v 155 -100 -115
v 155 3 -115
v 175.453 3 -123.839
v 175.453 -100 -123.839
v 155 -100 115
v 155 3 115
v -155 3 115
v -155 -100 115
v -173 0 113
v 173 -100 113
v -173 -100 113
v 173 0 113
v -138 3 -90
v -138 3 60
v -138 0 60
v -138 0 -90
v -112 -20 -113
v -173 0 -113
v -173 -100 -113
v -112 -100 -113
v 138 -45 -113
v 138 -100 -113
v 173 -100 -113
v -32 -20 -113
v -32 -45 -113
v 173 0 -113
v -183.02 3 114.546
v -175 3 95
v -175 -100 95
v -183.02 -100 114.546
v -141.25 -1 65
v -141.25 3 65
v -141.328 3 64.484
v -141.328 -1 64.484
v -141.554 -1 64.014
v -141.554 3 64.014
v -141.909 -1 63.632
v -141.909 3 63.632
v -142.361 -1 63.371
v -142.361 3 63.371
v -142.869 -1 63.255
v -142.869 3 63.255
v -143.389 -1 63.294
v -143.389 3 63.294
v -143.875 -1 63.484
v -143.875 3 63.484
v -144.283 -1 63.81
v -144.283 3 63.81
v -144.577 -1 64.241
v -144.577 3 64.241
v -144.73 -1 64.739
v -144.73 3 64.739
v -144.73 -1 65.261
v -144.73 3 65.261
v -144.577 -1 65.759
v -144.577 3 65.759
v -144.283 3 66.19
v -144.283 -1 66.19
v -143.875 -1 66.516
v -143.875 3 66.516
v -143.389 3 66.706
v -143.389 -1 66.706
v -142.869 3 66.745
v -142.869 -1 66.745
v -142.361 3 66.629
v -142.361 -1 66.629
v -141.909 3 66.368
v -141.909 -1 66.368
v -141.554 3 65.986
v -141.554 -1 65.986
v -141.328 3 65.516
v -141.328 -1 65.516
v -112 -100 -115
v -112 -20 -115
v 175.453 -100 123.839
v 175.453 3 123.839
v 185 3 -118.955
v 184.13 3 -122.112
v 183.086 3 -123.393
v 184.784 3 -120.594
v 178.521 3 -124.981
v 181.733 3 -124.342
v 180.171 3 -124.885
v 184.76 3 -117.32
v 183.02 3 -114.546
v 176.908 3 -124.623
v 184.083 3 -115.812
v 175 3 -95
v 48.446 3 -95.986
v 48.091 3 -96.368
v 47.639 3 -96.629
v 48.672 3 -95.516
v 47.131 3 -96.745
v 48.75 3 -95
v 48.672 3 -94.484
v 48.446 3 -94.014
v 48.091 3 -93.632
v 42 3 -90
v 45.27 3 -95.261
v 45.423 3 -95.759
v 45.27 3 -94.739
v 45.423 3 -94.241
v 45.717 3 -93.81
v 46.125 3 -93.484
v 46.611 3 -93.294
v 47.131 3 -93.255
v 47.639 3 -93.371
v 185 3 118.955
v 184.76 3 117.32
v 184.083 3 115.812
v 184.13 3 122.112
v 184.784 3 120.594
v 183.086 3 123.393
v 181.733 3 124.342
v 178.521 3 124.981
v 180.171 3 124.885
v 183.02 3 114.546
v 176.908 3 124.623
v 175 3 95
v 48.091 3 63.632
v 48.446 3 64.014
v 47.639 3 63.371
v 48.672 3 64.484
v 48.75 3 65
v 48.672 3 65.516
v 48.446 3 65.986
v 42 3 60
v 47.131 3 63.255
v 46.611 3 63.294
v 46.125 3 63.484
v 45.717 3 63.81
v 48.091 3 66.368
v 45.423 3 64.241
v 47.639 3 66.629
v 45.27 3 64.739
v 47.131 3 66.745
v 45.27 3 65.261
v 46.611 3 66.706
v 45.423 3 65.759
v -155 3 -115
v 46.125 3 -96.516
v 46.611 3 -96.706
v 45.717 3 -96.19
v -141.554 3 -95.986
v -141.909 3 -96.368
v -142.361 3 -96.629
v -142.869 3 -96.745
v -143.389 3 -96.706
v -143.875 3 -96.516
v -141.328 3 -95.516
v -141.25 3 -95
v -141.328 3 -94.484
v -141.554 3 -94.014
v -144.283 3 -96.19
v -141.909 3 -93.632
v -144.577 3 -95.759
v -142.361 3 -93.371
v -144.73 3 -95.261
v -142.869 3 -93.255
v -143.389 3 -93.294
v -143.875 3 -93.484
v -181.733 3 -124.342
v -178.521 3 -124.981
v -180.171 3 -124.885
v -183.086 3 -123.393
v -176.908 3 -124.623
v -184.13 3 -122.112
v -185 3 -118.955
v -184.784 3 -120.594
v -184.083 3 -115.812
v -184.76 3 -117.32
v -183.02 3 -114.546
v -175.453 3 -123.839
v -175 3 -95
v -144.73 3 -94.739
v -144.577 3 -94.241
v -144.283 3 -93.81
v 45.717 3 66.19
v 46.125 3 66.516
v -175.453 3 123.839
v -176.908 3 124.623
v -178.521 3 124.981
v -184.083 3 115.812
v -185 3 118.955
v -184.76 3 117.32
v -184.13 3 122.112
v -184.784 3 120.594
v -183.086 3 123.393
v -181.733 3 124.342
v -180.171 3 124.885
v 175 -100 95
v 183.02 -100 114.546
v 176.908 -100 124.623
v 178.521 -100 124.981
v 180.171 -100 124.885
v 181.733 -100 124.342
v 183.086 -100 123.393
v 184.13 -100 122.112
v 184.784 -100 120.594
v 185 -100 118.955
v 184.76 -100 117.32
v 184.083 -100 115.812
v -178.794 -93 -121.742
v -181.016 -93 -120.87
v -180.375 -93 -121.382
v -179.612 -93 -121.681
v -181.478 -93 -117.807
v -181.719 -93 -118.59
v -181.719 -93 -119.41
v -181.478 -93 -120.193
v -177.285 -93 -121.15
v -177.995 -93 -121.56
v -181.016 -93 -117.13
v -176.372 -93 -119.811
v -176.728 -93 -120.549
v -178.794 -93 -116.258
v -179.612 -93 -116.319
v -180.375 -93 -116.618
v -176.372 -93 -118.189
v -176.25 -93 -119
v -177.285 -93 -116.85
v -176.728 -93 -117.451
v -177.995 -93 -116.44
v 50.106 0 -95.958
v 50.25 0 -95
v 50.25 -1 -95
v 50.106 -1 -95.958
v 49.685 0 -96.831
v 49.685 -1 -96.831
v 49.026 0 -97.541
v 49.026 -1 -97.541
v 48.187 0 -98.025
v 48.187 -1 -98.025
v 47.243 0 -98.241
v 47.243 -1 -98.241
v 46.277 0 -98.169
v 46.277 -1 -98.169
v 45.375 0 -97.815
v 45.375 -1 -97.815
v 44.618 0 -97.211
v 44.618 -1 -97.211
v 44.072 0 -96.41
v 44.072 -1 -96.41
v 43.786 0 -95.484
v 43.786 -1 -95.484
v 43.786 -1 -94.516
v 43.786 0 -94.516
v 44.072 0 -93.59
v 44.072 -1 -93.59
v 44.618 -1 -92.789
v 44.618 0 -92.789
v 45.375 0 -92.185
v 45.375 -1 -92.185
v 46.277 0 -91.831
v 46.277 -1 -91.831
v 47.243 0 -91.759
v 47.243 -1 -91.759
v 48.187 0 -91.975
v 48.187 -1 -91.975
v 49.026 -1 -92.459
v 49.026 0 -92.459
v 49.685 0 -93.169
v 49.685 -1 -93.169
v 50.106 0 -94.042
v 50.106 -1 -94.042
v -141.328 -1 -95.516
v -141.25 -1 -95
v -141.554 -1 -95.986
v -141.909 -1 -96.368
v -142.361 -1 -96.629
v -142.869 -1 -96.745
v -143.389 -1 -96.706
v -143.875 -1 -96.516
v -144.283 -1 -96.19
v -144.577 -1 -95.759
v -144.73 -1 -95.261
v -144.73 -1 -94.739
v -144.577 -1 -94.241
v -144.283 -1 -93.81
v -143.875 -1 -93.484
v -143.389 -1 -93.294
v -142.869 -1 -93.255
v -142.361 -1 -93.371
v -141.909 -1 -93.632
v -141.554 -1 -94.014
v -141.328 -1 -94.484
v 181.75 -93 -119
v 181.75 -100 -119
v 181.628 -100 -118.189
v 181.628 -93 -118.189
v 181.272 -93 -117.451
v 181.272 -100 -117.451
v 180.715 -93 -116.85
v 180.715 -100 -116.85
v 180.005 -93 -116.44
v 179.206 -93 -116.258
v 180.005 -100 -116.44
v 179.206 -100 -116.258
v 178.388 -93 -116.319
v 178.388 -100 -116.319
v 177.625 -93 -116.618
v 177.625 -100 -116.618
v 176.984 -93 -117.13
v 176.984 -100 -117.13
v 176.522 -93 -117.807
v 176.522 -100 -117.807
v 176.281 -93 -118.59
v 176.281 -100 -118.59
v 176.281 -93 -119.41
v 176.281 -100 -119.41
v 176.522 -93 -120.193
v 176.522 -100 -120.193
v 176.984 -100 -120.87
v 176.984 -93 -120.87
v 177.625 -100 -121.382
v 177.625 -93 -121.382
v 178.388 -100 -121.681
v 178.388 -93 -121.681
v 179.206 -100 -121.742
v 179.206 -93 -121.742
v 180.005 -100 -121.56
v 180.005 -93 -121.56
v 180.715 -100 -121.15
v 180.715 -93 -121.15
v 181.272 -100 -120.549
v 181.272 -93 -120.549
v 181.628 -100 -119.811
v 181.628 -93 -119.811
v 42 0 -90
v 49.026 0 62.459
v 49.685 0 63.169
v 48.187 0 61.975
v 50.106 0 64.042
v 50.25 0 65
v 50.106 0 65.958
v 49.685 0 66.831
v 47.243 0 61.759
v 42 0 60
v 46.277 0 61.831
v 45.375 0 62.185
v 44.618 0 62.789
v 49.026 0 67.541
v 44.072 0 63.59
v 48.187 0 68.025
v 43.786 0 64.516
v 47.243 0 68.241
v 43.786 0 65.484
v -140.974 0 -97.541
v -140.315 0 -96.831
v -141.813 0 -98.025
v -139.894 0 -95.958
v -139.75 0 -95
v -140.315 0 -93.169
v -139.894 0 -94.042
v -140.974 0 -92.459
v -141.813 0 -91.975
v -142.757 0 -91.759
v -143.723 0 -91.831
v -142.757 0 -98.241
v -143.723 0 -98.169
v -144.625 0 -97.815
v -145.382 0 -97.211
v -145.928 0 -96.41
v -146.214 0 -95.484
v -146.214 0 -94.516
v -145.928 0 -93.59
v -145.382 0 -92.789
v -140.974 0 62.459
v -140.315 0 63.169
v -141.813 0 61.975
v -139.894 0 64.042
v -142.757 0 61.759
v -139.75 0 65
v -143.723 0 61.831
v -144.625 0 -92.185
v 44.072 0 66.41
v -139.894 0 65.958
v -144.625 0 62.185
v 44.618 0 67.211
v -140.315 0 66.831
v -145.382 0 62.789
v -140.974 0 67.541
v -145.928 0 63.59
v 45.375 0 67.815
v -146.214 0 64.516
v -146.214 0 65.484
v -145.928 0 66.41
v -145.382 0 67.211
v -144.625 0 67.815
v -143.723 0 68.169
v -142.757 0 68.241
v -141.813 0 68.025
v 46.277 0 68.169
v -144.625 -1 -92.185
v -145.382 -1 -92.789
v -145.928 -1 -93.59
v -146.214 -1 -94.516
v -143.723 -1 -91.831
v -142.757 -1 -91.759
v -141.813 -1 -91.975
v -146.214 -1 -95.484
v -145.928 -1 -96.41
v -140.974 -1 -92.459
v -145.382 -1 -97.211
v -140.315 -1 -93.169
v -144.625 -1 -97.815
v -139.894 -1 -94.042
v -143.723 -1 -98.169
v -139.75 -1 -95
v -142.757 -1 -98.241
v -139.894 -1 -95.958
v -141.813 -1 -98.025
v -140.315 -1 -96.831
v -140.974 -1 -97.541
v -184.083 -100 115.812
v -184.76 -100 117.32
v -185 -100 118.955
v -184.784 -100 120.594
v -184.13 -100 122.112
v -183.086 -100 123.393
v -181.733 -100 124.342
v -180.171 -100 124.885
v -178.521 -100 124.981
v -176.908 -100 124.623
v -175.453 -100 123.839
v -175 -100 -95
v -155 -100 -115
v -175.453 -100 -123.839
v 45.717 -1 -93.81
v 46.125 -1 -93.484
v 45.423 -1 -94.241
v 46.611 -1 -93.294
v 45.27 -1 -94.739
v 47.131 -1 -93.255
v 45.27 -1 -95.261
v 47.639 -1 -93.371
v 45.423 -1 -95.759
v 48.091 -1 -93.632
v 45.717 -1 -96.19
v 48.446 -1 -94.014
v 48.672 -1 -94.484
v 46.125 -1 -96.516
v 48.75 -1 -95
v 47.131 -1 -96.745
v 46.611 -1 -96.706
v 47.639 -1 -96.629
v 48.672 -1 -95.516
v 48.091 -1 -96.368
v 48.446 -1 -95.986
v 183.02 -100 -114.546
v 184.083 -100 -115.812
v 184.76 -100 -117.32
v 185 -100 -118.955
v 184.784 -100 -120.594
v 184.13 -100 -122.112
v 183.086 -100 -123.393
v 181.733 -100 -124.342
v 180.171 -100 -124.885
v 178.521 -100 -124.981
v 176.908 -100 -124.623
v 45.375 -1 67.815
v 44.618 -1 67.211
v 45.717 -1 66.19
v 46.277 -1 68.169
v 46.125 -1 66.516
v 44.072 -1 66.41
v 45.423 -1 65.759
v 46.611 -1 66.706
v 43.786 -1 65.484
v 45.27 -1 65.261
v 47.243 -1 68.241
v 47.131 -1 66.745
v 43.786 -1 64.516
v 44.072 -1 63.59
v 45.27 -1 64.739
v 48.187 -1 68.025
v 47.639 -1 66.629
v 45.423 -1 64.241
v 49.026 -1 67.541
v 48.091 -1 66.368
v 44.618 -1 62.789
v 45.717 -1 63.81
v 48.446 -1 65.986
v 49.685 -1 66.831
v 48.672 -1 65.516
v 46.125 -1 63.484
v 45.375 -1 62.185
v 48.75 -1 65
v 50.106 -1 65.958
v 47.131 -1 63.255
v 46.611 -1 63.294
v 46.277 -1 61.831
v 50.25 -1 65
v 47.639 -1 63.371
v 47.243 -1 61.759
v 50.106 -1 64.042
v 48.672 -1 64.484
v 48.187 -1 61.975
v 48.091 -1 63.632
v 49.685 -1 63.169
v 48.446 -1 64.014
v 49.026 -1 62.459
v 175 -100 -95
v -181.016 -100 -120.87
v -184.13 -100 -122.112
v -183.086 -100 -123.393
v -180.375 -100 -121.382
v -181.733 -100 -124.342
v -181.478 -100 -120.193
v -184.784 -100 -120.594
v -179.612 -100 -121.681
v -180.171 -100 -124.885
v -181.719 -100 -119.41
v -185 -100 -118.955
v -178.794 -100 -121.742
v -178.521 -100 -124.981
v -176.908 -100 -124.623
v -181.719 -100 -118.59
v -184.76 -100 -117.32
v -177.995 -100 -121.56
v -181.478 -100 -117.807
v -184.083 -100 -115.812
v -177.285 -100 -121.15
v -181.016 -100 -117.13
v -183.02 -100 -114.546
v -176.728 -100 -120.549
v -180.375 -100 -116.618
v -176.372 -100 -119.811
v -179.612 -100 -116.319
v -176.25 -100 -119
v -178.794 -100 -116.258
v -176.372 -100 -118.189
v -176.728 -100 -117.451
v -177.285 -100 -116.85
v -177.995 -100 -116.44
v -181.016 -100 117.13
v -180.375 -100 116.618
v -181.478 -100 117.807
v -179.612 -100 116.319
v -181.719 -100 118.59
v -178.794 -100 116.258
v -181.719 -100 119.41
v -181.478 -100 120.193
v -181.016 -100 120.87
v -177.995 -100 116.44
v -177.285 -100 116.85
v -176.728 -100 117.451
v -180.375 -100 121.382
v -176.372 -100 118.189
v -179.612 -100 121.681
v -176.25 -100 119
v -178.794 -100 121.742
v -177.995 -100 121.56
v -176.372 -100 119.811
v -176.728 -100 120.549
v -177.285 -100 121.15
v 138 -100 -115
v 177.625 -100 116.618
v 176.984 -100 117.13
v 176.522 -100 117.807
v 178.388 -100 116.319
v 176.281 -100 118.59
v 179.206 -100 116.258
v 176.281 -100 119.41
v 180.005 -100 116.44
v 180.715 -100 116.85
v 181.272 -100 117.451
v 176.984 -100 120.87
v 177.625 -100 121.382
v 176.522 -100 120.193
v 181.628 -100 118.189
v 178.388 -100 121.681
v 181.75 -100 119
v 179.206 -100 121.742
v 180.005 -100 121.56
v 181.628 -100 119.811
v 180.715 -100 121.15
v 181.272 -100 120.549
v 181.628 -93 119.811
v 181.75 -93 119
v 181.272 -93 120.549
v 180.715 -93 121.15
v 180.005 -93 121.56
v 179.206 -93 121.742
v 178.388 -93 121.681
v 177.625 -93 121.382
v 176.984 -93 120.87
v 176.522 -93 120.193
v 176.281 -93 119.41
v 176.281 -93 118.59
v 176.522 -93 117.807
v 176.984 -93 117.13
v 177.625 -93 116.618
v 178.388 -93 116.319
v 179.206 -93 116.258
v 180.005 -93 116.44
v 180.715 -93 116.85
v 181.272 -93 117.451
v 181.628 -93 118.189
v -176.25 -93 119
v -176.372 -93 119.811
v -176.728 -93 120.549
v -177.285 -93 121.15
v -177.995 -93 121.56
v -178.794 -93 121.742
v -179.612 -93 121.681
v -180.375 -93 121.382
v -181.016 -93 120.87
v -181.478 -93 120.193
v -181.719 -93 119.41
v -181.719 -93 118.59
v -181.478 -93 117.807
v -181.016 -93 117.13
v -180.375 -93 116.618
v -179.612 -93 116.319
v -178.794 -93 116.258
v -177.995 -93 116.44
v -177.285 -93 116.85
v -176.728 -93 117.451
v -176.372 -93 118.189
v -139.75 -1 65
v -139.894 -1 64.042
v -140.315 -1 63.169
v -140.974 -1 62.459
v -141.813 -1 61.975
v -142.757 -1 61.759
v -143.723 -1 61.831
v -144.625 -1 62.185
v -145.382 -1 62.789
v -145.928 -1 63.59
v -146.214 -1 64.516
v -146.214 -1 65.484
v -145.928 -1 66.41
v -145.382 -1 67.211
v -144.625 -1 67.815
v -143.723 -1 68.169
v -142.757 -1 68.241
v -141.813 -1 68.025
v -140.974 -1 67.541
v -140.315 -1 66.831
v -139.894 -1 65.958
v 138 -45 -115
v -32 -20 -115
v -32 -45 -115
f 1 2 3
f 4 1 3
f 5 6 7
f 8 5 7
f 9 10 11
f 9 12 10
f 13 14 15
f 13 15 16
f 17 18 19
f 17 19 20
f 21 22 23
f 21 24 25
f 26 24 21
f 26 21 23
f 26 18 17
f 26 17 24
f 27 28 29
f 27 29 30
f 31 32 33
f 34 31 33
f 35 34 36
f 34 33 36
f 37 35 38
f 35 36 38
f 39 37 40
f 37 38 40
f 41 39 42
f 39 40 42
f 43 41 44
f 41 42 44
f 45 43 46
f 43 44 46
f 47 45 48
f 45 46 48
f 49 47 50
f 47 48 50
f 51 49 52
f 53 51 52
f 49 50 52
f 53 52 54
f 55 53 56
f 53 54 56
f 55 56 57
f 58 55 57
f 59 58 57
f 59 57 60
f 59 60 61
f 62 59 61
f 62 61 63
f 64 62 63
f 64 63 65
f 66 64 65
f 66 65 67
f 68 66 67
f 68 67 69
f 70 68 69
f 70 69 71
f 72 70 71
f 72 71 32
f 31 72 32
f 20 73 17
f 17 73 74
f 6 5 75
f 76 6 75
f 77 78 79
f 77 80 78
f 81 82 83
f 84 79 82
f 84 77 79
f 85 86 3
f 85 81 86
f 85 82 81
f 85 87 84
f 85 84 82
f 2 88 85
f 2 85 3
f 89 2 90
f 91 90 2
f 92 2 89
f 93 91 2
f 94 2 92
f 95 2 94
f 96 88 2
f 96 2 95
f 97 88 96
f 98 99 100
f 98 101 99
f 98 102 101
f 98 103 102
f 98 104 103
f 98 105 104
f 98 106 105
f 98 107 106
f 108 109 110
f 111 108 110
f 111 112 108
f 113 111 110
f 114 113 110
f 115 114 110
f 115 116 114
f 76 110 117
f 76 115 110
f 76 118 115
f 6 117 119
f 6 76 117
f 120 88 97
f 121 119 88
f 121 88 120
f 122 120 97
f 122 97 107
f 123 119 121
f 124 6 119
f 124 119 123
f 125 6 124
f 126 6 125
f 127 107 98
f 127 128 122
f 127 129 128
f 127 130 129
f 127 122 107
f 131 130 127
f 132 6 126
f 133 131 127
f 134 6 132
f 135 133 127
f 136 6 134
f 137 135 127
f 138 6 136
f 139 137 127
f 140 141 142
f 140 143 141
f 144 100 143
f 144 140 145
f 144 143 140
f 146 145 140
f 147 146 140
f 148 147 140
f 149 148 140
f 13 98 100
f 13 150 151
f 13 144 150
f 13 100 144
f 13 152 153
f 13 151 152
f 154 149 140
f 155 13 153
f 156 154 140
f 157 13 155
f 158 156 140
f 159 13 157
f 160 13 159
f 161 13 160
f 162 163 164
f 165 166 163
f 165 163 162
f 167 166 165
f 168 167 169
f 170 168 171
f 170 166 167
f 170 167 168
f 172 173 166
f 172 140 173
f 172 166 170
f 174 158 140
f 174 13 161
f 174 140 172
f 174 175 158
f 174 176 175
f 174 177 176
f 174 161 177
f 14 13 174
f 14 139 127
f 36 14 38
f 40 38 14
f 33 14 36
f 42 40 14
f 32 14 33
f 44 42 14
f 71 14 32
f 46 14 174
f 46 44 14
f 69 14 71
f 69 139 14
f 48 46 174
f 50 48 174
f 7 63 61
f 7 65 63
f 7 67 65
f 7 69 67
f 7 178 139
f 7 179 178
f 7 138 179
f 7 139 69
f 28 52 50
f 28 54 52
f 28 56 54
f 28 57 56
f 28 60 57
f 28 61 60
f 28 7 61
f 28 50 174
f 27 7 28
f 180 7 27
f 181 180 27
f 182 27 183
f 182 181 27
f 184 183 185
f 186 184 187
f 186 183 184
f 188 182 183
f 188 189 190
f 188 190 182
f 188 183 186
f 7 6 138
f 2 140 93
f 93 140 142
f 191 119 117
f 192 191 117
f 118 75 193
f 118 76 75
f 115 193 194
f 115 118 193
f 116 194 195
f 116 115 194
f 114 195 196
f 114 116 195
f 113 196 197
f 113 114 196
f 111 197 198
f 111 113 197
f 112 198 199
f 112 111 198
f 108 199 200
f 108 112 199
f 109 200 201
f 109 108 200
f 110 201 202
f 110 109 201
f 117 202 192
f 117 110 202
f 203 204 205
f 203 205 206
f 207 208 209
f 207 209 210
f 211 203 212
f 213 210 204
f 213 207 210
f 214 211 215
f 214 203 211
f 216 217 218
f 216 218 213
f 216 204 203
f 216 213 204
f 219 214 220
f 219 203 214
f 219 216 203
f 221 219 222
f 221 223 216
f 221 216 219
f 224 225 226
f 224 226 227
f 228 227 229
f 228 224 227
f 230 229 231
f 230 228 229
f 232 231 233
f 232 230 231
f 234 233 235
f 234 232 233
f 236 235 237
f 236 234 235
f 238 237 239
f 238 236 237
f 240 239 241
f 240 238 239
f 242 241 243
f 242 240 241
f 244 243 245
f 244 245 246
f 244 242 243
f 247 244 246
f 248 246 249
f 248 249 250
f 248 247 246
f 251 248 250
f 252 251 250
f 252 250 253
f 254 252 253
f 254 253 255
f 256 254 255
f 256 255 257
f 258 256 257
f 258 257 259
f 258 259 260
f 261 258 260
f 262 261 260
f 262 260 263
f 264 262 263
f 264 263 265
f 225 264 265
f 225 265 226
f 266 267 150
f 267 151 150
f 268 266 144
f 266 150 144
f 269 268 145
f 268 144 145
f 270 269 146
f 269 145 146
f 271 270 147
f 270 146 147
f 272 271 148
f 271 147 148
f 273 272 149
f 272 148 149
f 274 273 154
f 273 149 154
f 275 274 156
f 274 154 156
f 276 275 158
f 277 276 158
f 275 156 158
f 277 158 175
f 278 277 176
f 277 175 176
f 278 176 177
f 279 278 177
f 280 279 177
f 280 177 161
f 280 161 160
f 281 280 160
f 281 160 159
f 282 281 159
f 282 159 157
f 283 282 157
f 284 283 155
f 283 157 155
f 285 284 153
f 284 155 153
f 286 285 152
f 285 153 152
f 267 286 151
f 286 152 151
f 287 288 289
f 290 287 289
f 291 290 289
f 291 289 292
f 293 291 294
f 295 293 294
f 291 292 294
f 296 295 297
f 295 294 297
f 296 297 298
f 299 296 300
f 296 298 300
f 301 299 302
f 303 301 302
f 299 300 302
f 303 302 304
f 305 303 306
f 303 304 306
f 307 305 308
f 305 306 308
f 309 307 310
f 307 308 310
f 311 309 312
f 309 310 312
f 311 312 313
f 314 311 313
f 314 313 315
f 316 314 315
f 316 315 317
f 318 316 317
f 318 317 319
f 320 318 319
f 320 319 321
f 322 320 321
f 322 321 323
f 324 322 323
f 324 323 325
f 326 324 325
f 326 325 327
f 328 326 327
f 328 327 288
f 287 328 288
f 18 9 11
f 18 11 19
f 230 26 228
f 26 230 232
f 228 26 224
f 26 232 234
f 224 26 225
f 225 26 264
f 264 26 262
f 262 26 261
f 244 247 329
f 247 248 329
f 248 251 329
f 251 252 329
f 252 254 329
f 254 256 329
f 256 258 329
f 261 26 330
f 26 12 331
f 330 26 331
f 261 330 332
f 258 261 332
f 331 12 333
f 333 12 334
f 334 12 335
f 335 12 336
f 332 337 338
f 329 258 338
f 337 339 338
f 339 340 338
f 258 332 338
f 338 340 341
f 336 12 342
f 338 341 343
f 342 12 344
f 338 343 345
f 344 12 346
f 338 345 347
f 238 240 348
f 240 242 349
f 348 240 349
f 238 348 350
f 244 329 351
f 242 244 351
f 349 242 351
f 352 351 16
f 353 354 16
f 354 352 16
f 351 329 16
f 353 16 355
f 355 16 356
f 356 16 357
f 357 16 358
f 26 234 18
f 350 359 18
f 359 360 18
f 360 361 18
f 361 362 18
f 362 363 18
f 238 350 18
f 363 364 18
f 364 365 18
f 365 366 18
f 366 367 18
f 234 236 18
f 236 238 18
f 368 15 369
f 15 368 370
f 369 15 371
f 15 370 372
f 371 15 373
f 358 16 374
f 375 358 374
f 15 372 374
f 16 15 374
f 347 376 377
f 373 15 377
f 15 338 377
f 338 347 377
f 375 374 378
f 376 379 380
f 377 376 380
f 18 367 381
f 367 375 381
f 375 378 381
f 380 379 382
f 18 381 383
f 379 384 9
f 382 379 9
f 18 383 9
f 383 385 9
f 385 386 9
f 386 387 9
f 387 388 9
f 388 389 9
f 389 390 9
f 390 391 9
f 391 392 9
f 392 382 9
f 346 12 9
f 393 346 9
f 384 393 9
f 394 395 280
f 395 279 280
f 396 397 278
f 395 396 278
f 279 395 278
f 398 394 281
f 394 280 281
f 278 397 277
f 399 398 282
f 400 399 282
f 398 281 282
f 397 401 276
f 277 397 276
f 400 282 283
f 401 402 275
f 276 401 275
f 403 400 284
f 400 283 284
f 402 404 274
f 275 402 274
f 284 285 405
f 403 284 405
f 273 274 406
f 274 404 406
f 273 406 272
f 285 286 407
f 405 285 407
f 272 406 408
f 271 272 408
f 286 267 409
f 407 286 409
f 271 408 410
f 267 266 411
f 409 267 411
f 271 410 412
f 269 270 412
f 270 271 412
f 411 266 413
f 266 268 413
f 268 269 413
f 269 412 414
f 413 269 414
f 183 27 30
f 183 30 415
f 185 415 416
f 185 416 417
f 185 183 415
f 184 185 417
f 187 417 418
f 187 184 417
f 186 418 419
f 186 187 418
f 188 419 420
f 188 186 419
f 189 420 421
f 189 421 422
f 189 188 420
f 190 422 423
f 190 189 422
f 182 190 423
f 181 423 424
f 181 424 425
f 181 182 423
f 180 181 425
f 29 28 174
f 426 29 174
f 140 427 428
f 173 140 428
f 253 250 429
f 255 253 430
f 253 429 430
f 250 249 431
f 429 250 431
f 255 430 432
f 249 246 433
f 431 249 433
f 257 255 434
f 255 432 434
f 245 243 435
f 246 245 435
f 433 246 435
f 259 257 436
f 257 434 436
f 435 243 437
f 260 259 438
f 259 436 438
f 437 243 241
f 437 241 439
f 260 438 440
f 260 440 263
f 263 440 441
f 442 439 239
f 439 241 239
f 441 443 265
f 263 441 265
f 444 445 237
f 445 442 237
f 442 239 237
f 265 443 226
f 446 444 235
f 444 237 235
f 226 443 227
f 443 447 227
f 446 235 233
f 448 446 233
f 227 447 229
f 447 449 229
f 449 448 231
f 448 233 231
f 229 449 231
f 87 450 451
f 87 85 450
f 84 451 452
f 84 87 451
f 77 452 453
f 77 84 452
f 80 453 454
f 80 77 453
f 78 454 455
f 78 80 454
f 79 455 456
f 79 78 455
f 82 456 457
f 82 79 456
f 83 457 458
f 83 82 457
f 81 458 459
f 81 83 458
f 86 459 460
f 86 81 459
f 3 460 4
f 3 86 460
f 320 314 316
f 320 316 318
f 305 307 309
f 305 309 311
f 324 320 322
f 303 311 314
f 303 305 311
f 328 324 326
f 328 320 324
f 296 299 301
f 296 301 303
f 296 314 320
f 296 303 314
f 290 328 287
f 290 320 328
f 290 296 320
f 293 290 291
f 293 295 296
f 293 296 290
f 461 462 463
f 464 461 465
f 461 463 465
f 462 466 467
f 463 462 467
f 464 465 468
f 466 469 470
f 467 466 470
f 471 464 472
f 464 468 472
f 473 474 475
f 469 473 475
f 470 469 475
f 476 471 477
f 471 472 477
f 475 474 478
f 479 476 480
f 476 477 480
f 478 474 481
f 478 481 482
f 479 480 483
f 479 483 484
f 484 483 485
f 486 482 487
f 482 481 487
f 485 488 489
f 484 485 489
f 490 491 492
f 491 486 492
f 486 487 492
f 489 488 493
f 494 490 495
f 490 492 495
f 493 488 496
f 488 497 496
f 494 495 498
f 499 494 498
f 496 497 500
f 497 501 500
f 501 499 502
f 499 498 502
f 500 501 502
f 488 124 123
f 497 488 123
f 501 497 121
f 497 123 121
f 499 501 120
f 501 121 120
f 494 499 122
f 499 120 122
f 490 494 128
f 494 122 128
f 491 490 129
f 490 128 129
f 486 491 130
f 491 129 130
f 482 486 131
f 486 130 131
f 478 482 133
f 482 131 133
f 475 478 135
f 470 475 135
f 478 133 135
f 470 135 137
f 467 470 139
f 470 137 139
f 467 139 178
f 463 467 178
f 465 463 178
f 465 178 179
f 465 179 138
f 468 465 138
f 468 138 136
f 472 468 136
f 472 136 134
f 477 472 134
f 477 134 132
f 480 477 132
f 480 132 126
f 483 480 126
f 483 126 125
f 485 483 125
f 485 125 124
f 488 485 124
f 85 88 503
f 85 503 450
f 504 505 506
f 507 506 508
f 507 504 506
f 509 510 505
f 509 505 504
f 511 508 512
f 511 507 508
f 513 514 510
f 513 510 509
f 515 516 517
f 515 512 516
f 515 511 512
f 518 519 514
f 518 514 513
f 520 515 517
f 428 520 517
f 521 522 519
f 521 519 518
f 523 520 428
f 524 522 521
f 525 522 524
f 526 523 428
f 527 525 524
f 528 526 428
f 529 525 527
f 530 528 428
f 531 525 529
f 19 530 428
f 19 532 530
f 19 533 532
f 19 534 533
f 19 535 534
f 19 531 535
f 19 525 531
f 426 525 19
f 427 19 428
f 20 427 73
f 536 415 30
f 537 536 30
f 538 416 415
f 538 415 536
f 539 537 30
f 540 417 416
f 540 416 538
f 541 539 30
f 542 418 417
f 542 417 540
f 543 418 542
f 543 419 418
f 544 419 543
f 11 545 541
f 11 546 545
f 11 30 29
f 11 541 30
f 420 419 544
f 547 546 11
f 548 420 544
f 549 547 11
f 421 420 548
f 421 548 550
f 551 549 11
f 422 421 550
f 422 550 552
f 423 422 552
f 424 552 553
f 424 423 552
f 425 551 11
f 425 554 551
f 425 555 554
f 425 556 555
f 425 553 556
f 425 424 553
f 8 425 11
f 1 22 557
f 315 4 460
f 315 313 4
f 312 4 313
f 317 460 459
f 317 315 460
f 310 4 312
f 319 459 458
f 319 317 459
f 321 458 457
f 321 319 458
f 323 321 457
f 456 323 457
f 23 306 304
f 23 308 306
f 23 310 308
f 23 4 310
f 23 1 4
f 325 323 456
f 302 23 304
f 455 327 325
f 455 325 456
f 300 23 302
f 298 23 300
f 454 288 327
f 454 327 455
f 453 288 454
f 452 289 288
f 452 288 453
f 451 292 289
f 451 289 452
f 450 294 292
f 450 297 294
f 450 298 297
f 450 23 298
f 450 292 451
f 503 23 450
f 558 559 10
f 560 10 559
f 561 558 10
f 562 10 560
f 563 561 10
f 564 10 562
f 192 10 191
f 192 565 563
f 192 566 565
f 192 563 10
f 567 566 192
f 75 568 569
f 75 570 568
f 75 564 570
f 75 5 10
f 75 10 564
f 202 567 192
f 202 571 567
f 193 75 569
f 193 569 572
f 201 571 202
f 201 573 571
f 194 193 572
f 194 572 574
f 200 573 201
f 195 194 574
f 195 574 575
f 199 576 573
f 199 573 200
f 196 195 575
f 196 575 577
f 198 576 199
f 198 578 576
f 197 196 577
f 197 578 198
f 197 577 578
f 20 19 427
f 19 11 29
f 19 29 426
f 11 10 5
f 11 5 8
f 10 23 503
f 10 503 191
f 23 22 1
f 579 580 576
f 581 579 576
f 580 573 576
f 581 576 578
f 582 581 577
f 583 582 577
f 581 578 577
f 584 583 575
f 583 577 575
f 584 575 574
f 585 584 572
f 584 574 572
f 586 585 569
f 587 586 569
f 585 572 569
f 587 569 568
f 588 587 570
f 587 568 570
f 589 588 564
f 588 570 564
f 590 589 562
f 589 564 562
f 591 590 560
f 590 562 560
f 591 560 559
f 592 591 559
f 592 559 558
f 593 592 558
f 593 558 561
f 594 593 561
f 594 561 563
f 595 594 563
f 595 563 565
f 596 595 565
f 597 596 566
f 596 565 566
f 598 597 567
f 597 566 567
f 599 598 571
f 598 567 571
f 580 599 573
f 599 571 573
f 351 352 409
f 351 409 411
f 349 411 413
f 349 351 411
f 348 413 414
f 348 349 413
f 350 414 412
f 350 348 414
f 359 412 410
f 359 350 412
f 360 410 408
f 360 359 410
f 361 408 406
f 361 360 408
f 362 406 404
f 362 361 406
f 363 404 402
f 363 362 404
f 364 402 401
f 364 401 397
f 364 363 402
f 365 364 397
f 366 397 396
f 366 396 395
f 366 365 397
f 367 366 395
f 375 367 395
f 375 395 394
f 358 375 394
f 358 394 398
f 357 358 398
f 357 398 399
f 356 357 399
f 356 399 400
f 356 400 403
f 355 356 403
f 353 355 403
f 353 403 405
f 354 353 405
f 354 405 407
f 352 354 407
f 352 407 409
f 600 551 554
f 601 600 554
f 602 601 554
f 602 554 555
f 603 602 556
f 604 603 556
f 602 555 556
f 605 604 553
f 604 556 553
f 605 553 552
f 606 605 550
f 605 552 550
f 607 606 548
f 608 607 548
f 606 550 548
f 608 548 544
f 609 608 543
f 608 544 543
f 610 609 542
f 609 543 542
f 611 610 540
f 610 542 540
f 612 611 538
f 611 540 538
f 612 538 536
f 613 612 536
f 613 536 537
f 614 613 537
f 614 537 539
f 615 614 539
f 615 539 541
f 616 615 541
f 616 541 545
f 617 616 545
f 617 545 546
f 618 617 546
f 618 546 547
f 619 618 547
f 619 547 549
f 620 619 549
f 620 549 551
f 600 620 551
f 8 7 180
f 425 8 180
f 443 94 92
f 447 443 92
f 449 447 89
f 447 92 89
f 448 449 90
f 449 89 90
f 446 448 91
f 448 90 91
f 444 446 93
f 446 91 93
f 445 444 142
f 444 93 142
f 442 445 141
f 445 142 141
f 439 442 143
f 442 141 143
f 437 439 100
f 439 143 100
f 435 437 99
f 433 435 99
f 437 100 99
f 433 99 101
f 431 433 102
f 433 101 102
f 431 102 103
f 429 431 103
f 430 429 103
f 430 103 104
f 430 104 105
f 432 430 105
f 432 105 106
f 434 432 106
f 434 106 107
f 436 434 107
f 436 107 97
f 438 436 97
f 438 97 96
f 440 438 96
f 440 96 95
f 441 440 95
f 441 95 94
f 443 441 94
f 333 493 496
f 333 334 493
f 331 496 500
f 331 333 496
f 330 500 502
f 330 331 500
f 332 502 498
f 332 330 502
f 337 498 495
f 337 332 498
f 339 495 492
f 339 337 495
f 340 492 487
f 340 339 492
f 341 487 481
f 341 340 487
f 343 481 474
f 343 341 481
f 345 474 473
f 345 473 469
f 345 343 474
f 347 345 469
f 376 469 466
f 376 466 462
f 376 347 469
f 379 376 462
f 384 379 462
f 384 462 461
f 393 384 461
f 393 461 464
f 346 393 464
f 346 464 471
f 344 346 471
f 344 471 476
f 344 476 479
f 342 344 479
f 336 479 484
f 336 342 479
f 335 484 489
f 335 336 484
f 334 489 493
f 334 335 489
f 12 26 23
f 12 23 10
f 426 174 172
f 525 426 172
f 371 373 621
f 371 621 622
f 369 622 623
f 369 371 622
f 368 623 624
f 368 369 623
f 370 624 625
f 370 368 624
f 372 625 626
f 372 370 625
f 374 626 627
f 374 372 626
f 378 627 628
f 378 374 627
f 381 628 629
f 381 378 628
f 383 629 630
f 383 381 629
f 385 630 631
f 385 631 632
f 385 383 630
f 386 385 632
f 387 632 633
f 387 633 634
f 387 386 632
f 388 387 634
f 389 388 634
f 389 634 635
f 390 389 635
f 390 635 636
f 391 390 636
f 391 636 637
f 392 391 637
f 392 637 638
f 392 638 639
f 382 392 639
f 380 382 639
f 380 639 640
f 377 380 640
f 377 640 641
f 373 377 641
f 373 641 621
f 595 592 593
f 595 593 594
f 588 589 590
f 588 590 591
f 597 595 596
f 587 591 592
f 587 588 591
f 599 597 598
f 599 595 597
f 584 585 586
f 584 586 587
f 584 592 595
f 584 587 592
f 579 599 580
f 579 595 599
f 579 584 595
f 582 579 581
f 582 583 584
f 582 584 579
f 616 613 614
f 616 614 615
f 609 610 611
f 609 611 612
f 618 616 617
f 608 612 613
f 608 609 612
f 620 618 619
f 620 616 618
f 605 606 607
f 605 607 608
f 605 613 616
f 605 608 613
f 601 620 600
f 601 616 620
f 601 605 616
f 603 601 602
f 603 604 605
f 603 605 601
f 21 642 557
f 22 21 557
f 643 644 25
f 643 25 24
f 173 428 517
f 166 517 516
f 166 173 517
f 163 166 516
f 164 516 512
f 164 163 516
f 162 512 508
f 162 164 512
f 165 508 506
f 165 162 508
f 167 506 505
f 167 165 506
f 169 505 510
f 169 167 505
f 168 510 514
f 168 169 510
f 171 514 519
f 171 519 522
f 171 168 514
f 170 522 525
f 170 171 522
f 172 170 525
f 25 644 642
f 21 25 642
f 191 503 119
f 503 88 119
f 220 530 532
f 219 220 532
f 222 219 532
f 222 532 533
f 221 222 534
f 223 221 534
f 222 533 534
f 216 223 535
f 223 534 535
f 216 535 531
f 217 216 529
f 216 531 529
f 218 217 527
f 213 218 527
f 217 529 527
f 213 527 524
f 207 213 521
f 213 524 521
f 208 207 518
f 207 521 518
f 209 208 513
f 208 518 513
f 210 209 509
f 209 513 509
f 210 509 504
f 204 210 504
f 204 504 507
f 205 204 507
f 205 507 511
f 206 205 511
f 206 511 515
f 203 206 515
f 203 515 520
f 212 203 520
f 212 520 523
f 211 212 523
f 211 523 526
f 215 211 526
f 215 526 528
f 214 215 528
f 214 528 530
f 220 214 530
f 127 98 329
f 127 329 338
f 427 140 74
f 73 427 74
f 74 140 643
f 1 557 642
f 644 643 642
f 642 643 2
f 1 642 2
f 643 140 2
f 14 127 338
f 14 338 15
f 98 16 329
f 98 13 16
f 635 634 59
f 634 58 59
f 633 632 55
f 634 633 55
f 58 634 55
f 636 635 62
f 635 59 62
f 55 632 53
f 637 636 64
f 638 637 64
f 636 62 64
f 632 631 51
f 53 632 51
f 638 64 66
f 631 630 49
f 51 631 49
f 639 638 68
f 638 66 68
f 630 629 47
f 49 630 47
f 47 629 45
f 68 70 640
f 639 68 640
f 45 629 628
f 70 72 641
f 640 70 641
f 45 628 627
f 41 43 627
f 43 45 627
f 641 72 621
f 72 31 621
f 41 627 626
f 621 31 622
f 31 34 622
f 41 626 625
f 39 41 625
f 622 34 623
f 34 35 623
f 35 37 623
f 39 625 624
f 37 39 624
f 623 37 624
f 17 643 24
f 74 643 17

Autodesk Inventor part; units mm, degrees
ref_plane "YZ Plane" through (0, 0, 0) normal (1, 0, 0) x (0, 1, 0)
ref_plane "XZ Plane" through (0, 0, 0) normal (0, 1, 0) x (-1, 0, 0)
ref_plane "XY Plane" through (0, 0, 0) normal (0, 0, 1) x (1, 0, 0)
sketch "Sketch1" plane through (0, 0, 0) normal (0, 1, 0) x (-1, 0, 0)
  line L0 (175, -115) -> (-175, -115)
  line L1 (-175, -115) -> (-175, 115)
  line L2 (-175, 115) -> (175, 115)
  line L3 (175, 115) -> (175, -115)
  line L4 (0, -115) -> (0, 115) construction
  line L5 (175, 0) -> (-175, 0) construction
  point P0 (0, 0)
  point P1 (0, 0)
  dimension "d0" = 350
  dimension "d1" = 230
extrude "Extrusion1" add sketch "Sketch1" along normal blind 3
sketch "Sketch6" plane through (0, 3, 0) normal (0, 1, 0) x (1, 0, 0)
  line L0 (175, 115) -> (-175, 115) construction
  line L1 (0, 115) -> (0, -115) construction
  line L2 (175, -115) -> (-175, -115) construction
  line L3 (-175, 115) -> (-175, -115) construction
  line L4 (-175, 0) -> (175, 0) construction
  line L5 (175, -115) -> (175, 115) construction
  circle A0 centre (-179, 119) radius 6
  line L6 (-175, 115) -> (-179, 115) construction
  line L7 (-179, 115) -> (-179, 119) construction
  line L8 (-179, 119) -> (-175, 119) construction
  line L9 (-175, 119) -> (-175, 115) construction
  line L10 (-155, 115) -> (-175.4528, 123.8392)
  line L11 (-175, 95) -> (-183.0203, 114.5461)
  line L12 (-175, 95) -> (-175, 115)
  line L13 (-155, 115) -> (-175, 115)
  circle A1 centre (-179, -119) radius 6
  line L14 (-155, -115) -> (-175.4528, -123.8392)
  line L15 (-175, -95) -> (-183.0203, -114.5461)
  line L16 (-175, -95) -> (-175, -115)
  line L17 (-155, -115) -> (-175, -115)
  circle A2 centre (179, 119) radius 6
  line L18 (155, 115) -> (175.4528, 123.8392)
  line L19 (175, 95) -> (183.0203, 114.5461)
  line L20 (175, 95) -> (175, 115)
  line L21 (155, 115) -> (175, 115)
  line L22 (175, -95) -> (183.0203, -114.5461)
  circle A3 centre (179, -119) radius 6
  line L23 (155, -115) -> (175.4528, -123.8392)
  line L24 (155, -115) -> (175, -115)
  line L25 (175, -95) -> (175, -115)
  circle A4 centre (179, -119) radius 2.75
  circle A5 centre (179, 119) radius 2.75
  circle A6 centre (-179, -119) radius 2.75
  circle A7 centre (-179, 119) radius 2.75
  point P0 (0, 0)
  dimension "d22" = 12
  dimension "d23" = 4
  dimension "d24" = 4
  dimension "d25" = 20
  dimension "d26" = 20
  dimension "d30" = 5.5
extrude "Extrusion6" add sketch "Sketch6" against normal blind 103 contours A0 L13 L12 | A0 L10 L13 | A0 L12 L11 | A1 L16 L17 | L15 L16 A1 | A1 L17 L14 | A2 L20 L21 | A2 L21 L18 | L19 L20 A2 | L22 A3 L25 | A3 L24 L25 | A3 L23 L24 | A4 | A5 | A6 | A7 picked at (-175.087, 116.3056) picked at (-175.087, -116.3056) picked at (175.0917, 116.2969) picked at (175.0917, -116.2969)
sketch "Sketch9" plane through (0, 0, 0) normal (0, -1, 0) x (1, 0, 0)
  line L0 (-175, -95) -> (-175, -115) projected
  line L1 (175, 115) -> (175, 95) projected
  line L2 (-175, -115) -> (175, -115)
  line L3 (175, -115) -> (175, 115)
  line L4 (175, 115) -> (-175, 115)
  line L5 (-175, 115) -> (-175, -115)
  line L6 (-173, -113) -> (173, -113)
  line L7 (173, -113) -> (173, 113)
  line L8 (173, 113) -> (-173, 113)
  line L9 (-173, 113) -> (-173, -113)
  line L10 (0, -115) -> (0, 115) construction
  line L11 (-155, 115) -> (155, 115) construction
  point P0 (0, 0)
  dimension "d31" = 2
  dimension "d32" = 2
  dimension "d33" = 2
  dimension "d34" = 2
extrude "Extrusion7" add sketch "Sketch9" along normal blind 100
sketch "Sketch10" plane through (155, 3, -115) normal (0, 0, -1) x (-1, 0, 0)
  line L0 (0, -103) -> (310, -103) projected
  line L1 (17, -103) -> (267, -103)
  line L2 (267, -103) -> (267, -48)
  line L3 (267, -48) -> (17, -48)
  line L4 (17, -48) -> (17, -103)
  line L5 (0, 0) -> (0, -103) projected
  line L6 (310, 0) -> (0, 0) construction
  line L7 (155, 0) -> (155, -103) construction
  line L8 (267, -48) -> (187, -48)
  line L9 (187, -48) -> (187, -23)
  line L10 (187, -23) -> (267, -23)
  line L11 (267, -23) -> (267, -48)
  point P0 (155, -3)
  point P1 (-18, -103)
  dimension "d38" = 55
  dimension "d39" = 35
  dimension "d40" = 250
  dimension "d41" = 25
  dimension "d42" = 80
extrude "Extrusion8" cut sketch "Sketch10" against normal up to next
sketch "Sketch11" plane through (0, 3, 0) normal (0, 1, 0) x (1, 0, 0)
  line L0 (-138, 90) -> (42, 90)
  line L1 (42, 90) -> (42, -60)
  line L2 (42, -60) -> (-138, -60)
  line L3 (-138, -60) -> (-138, 90)
  line L4 (-173, -113) -> (-173, 113) projected
  line L5 (-173, 113) -> (173, 113) projected
  point P0 (0, 0)
  dimension "d45" = 180
  dimension "d46" = 150
  dimension "d47" = 35
  dimension "d48" = 173
extrude "Extrusion9" cut sketch "Sketch11" against normal up to next
sketch "Sketch13" plane through (0, -100, 0) normal (0, -1, 0) x (1, 0, 0)
  arc A0 (-183.0203, -114.5461) -> (-175.4528, -123.8392) centre (-179, -119) ccw projected
  line L0 (-175, 95) -> (-175, -95) construction
  line L1 (-175, 0) -> (175, 0) construction
  line L2 (175, 95) -> (175, -95) construction
  line L3 (155, -115) -> (-155, -115) construction
  line L4 (0, -115) -> (0, 115) construction
  line L5 (-155, 115) -> (155, 115) construction
  circle A1 centre (-179, 119) radius 2.75
  circle A2 centre (179, 119) radius 2.75
  circle A3 centre (-179, -119) radius 2.75
  circle A4 centre (179, -119) radius 2.75
  point P0 (0, 0)
  dimension "d51" = 5.5
extrude "Extrusion10" cut sketch "Sketch13" against normal blind 7
sketch "Sketch14" plane through (0, 3, 0) normal (0, 1, 0) x (1, 0, 0)
  line L0 (-138, 90) -> (42, 90) construction
  line L1 (-138, -60) -> (-138, 90) construction
  line L2 (42, -60) -> (-138, -60) construction
  line L3 (42, 90) -> (42, -60) construction
  line L4 (-143, 95) -> (47, 95) construction
  line L5 (47, 95) -> (47, -65) construction
  line L6 (47, -65) -> (-143, -65) construction
  line L7 (-143, -65) -> (-143, 95) construction
  circle A0 centre (-143, 95) radius 3
  circle A1 centre (-143, 95) radius 1.75
  line L8 (-48, 95) -> (-48, -65) construction
  line L9 (-143, 15) -> (47, 15) construction
  circle A2 centre (47, 95) radius 3
  circle A3 centre (47, 95) radius 1.75
  circle A4 centre (-143, -65) radius 3
  circle A5 centre (-143, -65) radius 1.75
  circle A6 centre (47, -65) radius 3
  circle A7 centre (47, -65) radius 1.75
  point P0 (0, 0)
  dimension "d54" = 5
  dimension "d55" = 5
  dimension "d56" = 5
  dimension "d57" = 5
  dimension "d58" = 6
  dimension "d59" = 3.5
extrude "Extrusion11" cut sketch "Sketch14" against normal up to next contours A1 | A3 | A5 | A7
sketch "Sketch15" plane through (0, 3, 0) normal (0, 1, 0) x (1, 0, 0)
  circle A0 centre (47, 95) radius 1.75 projected
  circle A1 centre (47, 95) radius 3.25
  line L0 (-138, 90) -> (42, 90) construction
  line L1 (42, 90) -> (42, -60) construction
  line L2 (42, -60) -> (-138, -60) construction
  line L3 (-138, -60) -> (-138, 90) construction
  line L4 (42, -60) -> (42, 90) construction
  line L5 (42, 15) -> (-138, 15) construction
  line L6 (-138, 90) -> (-138, -60) construction
  line L7 (42, 90) -> (-138, 90) construction
  line L8 (-48, 90) -> (-48, -60) construction
  circle A2 centre (47, -65) radius 3.25
  circle A3 centre (-143, 95) radius 3.25
  circle A4 centre (-143, -65) radius 3.25
  circle A5 centre (47, -65) radius 1.75 projected
  circle A6 centre (-143, -65) radius 1.75 projected
  circle A7 centre (-143, 95) radius 1.75 projected
  point P0 (0, 0)
  dimension "d62" = 6.5
extrude "Extrusion12" add sketch "Sketch15" against normal blind 4
properties part number "vna_cover"
